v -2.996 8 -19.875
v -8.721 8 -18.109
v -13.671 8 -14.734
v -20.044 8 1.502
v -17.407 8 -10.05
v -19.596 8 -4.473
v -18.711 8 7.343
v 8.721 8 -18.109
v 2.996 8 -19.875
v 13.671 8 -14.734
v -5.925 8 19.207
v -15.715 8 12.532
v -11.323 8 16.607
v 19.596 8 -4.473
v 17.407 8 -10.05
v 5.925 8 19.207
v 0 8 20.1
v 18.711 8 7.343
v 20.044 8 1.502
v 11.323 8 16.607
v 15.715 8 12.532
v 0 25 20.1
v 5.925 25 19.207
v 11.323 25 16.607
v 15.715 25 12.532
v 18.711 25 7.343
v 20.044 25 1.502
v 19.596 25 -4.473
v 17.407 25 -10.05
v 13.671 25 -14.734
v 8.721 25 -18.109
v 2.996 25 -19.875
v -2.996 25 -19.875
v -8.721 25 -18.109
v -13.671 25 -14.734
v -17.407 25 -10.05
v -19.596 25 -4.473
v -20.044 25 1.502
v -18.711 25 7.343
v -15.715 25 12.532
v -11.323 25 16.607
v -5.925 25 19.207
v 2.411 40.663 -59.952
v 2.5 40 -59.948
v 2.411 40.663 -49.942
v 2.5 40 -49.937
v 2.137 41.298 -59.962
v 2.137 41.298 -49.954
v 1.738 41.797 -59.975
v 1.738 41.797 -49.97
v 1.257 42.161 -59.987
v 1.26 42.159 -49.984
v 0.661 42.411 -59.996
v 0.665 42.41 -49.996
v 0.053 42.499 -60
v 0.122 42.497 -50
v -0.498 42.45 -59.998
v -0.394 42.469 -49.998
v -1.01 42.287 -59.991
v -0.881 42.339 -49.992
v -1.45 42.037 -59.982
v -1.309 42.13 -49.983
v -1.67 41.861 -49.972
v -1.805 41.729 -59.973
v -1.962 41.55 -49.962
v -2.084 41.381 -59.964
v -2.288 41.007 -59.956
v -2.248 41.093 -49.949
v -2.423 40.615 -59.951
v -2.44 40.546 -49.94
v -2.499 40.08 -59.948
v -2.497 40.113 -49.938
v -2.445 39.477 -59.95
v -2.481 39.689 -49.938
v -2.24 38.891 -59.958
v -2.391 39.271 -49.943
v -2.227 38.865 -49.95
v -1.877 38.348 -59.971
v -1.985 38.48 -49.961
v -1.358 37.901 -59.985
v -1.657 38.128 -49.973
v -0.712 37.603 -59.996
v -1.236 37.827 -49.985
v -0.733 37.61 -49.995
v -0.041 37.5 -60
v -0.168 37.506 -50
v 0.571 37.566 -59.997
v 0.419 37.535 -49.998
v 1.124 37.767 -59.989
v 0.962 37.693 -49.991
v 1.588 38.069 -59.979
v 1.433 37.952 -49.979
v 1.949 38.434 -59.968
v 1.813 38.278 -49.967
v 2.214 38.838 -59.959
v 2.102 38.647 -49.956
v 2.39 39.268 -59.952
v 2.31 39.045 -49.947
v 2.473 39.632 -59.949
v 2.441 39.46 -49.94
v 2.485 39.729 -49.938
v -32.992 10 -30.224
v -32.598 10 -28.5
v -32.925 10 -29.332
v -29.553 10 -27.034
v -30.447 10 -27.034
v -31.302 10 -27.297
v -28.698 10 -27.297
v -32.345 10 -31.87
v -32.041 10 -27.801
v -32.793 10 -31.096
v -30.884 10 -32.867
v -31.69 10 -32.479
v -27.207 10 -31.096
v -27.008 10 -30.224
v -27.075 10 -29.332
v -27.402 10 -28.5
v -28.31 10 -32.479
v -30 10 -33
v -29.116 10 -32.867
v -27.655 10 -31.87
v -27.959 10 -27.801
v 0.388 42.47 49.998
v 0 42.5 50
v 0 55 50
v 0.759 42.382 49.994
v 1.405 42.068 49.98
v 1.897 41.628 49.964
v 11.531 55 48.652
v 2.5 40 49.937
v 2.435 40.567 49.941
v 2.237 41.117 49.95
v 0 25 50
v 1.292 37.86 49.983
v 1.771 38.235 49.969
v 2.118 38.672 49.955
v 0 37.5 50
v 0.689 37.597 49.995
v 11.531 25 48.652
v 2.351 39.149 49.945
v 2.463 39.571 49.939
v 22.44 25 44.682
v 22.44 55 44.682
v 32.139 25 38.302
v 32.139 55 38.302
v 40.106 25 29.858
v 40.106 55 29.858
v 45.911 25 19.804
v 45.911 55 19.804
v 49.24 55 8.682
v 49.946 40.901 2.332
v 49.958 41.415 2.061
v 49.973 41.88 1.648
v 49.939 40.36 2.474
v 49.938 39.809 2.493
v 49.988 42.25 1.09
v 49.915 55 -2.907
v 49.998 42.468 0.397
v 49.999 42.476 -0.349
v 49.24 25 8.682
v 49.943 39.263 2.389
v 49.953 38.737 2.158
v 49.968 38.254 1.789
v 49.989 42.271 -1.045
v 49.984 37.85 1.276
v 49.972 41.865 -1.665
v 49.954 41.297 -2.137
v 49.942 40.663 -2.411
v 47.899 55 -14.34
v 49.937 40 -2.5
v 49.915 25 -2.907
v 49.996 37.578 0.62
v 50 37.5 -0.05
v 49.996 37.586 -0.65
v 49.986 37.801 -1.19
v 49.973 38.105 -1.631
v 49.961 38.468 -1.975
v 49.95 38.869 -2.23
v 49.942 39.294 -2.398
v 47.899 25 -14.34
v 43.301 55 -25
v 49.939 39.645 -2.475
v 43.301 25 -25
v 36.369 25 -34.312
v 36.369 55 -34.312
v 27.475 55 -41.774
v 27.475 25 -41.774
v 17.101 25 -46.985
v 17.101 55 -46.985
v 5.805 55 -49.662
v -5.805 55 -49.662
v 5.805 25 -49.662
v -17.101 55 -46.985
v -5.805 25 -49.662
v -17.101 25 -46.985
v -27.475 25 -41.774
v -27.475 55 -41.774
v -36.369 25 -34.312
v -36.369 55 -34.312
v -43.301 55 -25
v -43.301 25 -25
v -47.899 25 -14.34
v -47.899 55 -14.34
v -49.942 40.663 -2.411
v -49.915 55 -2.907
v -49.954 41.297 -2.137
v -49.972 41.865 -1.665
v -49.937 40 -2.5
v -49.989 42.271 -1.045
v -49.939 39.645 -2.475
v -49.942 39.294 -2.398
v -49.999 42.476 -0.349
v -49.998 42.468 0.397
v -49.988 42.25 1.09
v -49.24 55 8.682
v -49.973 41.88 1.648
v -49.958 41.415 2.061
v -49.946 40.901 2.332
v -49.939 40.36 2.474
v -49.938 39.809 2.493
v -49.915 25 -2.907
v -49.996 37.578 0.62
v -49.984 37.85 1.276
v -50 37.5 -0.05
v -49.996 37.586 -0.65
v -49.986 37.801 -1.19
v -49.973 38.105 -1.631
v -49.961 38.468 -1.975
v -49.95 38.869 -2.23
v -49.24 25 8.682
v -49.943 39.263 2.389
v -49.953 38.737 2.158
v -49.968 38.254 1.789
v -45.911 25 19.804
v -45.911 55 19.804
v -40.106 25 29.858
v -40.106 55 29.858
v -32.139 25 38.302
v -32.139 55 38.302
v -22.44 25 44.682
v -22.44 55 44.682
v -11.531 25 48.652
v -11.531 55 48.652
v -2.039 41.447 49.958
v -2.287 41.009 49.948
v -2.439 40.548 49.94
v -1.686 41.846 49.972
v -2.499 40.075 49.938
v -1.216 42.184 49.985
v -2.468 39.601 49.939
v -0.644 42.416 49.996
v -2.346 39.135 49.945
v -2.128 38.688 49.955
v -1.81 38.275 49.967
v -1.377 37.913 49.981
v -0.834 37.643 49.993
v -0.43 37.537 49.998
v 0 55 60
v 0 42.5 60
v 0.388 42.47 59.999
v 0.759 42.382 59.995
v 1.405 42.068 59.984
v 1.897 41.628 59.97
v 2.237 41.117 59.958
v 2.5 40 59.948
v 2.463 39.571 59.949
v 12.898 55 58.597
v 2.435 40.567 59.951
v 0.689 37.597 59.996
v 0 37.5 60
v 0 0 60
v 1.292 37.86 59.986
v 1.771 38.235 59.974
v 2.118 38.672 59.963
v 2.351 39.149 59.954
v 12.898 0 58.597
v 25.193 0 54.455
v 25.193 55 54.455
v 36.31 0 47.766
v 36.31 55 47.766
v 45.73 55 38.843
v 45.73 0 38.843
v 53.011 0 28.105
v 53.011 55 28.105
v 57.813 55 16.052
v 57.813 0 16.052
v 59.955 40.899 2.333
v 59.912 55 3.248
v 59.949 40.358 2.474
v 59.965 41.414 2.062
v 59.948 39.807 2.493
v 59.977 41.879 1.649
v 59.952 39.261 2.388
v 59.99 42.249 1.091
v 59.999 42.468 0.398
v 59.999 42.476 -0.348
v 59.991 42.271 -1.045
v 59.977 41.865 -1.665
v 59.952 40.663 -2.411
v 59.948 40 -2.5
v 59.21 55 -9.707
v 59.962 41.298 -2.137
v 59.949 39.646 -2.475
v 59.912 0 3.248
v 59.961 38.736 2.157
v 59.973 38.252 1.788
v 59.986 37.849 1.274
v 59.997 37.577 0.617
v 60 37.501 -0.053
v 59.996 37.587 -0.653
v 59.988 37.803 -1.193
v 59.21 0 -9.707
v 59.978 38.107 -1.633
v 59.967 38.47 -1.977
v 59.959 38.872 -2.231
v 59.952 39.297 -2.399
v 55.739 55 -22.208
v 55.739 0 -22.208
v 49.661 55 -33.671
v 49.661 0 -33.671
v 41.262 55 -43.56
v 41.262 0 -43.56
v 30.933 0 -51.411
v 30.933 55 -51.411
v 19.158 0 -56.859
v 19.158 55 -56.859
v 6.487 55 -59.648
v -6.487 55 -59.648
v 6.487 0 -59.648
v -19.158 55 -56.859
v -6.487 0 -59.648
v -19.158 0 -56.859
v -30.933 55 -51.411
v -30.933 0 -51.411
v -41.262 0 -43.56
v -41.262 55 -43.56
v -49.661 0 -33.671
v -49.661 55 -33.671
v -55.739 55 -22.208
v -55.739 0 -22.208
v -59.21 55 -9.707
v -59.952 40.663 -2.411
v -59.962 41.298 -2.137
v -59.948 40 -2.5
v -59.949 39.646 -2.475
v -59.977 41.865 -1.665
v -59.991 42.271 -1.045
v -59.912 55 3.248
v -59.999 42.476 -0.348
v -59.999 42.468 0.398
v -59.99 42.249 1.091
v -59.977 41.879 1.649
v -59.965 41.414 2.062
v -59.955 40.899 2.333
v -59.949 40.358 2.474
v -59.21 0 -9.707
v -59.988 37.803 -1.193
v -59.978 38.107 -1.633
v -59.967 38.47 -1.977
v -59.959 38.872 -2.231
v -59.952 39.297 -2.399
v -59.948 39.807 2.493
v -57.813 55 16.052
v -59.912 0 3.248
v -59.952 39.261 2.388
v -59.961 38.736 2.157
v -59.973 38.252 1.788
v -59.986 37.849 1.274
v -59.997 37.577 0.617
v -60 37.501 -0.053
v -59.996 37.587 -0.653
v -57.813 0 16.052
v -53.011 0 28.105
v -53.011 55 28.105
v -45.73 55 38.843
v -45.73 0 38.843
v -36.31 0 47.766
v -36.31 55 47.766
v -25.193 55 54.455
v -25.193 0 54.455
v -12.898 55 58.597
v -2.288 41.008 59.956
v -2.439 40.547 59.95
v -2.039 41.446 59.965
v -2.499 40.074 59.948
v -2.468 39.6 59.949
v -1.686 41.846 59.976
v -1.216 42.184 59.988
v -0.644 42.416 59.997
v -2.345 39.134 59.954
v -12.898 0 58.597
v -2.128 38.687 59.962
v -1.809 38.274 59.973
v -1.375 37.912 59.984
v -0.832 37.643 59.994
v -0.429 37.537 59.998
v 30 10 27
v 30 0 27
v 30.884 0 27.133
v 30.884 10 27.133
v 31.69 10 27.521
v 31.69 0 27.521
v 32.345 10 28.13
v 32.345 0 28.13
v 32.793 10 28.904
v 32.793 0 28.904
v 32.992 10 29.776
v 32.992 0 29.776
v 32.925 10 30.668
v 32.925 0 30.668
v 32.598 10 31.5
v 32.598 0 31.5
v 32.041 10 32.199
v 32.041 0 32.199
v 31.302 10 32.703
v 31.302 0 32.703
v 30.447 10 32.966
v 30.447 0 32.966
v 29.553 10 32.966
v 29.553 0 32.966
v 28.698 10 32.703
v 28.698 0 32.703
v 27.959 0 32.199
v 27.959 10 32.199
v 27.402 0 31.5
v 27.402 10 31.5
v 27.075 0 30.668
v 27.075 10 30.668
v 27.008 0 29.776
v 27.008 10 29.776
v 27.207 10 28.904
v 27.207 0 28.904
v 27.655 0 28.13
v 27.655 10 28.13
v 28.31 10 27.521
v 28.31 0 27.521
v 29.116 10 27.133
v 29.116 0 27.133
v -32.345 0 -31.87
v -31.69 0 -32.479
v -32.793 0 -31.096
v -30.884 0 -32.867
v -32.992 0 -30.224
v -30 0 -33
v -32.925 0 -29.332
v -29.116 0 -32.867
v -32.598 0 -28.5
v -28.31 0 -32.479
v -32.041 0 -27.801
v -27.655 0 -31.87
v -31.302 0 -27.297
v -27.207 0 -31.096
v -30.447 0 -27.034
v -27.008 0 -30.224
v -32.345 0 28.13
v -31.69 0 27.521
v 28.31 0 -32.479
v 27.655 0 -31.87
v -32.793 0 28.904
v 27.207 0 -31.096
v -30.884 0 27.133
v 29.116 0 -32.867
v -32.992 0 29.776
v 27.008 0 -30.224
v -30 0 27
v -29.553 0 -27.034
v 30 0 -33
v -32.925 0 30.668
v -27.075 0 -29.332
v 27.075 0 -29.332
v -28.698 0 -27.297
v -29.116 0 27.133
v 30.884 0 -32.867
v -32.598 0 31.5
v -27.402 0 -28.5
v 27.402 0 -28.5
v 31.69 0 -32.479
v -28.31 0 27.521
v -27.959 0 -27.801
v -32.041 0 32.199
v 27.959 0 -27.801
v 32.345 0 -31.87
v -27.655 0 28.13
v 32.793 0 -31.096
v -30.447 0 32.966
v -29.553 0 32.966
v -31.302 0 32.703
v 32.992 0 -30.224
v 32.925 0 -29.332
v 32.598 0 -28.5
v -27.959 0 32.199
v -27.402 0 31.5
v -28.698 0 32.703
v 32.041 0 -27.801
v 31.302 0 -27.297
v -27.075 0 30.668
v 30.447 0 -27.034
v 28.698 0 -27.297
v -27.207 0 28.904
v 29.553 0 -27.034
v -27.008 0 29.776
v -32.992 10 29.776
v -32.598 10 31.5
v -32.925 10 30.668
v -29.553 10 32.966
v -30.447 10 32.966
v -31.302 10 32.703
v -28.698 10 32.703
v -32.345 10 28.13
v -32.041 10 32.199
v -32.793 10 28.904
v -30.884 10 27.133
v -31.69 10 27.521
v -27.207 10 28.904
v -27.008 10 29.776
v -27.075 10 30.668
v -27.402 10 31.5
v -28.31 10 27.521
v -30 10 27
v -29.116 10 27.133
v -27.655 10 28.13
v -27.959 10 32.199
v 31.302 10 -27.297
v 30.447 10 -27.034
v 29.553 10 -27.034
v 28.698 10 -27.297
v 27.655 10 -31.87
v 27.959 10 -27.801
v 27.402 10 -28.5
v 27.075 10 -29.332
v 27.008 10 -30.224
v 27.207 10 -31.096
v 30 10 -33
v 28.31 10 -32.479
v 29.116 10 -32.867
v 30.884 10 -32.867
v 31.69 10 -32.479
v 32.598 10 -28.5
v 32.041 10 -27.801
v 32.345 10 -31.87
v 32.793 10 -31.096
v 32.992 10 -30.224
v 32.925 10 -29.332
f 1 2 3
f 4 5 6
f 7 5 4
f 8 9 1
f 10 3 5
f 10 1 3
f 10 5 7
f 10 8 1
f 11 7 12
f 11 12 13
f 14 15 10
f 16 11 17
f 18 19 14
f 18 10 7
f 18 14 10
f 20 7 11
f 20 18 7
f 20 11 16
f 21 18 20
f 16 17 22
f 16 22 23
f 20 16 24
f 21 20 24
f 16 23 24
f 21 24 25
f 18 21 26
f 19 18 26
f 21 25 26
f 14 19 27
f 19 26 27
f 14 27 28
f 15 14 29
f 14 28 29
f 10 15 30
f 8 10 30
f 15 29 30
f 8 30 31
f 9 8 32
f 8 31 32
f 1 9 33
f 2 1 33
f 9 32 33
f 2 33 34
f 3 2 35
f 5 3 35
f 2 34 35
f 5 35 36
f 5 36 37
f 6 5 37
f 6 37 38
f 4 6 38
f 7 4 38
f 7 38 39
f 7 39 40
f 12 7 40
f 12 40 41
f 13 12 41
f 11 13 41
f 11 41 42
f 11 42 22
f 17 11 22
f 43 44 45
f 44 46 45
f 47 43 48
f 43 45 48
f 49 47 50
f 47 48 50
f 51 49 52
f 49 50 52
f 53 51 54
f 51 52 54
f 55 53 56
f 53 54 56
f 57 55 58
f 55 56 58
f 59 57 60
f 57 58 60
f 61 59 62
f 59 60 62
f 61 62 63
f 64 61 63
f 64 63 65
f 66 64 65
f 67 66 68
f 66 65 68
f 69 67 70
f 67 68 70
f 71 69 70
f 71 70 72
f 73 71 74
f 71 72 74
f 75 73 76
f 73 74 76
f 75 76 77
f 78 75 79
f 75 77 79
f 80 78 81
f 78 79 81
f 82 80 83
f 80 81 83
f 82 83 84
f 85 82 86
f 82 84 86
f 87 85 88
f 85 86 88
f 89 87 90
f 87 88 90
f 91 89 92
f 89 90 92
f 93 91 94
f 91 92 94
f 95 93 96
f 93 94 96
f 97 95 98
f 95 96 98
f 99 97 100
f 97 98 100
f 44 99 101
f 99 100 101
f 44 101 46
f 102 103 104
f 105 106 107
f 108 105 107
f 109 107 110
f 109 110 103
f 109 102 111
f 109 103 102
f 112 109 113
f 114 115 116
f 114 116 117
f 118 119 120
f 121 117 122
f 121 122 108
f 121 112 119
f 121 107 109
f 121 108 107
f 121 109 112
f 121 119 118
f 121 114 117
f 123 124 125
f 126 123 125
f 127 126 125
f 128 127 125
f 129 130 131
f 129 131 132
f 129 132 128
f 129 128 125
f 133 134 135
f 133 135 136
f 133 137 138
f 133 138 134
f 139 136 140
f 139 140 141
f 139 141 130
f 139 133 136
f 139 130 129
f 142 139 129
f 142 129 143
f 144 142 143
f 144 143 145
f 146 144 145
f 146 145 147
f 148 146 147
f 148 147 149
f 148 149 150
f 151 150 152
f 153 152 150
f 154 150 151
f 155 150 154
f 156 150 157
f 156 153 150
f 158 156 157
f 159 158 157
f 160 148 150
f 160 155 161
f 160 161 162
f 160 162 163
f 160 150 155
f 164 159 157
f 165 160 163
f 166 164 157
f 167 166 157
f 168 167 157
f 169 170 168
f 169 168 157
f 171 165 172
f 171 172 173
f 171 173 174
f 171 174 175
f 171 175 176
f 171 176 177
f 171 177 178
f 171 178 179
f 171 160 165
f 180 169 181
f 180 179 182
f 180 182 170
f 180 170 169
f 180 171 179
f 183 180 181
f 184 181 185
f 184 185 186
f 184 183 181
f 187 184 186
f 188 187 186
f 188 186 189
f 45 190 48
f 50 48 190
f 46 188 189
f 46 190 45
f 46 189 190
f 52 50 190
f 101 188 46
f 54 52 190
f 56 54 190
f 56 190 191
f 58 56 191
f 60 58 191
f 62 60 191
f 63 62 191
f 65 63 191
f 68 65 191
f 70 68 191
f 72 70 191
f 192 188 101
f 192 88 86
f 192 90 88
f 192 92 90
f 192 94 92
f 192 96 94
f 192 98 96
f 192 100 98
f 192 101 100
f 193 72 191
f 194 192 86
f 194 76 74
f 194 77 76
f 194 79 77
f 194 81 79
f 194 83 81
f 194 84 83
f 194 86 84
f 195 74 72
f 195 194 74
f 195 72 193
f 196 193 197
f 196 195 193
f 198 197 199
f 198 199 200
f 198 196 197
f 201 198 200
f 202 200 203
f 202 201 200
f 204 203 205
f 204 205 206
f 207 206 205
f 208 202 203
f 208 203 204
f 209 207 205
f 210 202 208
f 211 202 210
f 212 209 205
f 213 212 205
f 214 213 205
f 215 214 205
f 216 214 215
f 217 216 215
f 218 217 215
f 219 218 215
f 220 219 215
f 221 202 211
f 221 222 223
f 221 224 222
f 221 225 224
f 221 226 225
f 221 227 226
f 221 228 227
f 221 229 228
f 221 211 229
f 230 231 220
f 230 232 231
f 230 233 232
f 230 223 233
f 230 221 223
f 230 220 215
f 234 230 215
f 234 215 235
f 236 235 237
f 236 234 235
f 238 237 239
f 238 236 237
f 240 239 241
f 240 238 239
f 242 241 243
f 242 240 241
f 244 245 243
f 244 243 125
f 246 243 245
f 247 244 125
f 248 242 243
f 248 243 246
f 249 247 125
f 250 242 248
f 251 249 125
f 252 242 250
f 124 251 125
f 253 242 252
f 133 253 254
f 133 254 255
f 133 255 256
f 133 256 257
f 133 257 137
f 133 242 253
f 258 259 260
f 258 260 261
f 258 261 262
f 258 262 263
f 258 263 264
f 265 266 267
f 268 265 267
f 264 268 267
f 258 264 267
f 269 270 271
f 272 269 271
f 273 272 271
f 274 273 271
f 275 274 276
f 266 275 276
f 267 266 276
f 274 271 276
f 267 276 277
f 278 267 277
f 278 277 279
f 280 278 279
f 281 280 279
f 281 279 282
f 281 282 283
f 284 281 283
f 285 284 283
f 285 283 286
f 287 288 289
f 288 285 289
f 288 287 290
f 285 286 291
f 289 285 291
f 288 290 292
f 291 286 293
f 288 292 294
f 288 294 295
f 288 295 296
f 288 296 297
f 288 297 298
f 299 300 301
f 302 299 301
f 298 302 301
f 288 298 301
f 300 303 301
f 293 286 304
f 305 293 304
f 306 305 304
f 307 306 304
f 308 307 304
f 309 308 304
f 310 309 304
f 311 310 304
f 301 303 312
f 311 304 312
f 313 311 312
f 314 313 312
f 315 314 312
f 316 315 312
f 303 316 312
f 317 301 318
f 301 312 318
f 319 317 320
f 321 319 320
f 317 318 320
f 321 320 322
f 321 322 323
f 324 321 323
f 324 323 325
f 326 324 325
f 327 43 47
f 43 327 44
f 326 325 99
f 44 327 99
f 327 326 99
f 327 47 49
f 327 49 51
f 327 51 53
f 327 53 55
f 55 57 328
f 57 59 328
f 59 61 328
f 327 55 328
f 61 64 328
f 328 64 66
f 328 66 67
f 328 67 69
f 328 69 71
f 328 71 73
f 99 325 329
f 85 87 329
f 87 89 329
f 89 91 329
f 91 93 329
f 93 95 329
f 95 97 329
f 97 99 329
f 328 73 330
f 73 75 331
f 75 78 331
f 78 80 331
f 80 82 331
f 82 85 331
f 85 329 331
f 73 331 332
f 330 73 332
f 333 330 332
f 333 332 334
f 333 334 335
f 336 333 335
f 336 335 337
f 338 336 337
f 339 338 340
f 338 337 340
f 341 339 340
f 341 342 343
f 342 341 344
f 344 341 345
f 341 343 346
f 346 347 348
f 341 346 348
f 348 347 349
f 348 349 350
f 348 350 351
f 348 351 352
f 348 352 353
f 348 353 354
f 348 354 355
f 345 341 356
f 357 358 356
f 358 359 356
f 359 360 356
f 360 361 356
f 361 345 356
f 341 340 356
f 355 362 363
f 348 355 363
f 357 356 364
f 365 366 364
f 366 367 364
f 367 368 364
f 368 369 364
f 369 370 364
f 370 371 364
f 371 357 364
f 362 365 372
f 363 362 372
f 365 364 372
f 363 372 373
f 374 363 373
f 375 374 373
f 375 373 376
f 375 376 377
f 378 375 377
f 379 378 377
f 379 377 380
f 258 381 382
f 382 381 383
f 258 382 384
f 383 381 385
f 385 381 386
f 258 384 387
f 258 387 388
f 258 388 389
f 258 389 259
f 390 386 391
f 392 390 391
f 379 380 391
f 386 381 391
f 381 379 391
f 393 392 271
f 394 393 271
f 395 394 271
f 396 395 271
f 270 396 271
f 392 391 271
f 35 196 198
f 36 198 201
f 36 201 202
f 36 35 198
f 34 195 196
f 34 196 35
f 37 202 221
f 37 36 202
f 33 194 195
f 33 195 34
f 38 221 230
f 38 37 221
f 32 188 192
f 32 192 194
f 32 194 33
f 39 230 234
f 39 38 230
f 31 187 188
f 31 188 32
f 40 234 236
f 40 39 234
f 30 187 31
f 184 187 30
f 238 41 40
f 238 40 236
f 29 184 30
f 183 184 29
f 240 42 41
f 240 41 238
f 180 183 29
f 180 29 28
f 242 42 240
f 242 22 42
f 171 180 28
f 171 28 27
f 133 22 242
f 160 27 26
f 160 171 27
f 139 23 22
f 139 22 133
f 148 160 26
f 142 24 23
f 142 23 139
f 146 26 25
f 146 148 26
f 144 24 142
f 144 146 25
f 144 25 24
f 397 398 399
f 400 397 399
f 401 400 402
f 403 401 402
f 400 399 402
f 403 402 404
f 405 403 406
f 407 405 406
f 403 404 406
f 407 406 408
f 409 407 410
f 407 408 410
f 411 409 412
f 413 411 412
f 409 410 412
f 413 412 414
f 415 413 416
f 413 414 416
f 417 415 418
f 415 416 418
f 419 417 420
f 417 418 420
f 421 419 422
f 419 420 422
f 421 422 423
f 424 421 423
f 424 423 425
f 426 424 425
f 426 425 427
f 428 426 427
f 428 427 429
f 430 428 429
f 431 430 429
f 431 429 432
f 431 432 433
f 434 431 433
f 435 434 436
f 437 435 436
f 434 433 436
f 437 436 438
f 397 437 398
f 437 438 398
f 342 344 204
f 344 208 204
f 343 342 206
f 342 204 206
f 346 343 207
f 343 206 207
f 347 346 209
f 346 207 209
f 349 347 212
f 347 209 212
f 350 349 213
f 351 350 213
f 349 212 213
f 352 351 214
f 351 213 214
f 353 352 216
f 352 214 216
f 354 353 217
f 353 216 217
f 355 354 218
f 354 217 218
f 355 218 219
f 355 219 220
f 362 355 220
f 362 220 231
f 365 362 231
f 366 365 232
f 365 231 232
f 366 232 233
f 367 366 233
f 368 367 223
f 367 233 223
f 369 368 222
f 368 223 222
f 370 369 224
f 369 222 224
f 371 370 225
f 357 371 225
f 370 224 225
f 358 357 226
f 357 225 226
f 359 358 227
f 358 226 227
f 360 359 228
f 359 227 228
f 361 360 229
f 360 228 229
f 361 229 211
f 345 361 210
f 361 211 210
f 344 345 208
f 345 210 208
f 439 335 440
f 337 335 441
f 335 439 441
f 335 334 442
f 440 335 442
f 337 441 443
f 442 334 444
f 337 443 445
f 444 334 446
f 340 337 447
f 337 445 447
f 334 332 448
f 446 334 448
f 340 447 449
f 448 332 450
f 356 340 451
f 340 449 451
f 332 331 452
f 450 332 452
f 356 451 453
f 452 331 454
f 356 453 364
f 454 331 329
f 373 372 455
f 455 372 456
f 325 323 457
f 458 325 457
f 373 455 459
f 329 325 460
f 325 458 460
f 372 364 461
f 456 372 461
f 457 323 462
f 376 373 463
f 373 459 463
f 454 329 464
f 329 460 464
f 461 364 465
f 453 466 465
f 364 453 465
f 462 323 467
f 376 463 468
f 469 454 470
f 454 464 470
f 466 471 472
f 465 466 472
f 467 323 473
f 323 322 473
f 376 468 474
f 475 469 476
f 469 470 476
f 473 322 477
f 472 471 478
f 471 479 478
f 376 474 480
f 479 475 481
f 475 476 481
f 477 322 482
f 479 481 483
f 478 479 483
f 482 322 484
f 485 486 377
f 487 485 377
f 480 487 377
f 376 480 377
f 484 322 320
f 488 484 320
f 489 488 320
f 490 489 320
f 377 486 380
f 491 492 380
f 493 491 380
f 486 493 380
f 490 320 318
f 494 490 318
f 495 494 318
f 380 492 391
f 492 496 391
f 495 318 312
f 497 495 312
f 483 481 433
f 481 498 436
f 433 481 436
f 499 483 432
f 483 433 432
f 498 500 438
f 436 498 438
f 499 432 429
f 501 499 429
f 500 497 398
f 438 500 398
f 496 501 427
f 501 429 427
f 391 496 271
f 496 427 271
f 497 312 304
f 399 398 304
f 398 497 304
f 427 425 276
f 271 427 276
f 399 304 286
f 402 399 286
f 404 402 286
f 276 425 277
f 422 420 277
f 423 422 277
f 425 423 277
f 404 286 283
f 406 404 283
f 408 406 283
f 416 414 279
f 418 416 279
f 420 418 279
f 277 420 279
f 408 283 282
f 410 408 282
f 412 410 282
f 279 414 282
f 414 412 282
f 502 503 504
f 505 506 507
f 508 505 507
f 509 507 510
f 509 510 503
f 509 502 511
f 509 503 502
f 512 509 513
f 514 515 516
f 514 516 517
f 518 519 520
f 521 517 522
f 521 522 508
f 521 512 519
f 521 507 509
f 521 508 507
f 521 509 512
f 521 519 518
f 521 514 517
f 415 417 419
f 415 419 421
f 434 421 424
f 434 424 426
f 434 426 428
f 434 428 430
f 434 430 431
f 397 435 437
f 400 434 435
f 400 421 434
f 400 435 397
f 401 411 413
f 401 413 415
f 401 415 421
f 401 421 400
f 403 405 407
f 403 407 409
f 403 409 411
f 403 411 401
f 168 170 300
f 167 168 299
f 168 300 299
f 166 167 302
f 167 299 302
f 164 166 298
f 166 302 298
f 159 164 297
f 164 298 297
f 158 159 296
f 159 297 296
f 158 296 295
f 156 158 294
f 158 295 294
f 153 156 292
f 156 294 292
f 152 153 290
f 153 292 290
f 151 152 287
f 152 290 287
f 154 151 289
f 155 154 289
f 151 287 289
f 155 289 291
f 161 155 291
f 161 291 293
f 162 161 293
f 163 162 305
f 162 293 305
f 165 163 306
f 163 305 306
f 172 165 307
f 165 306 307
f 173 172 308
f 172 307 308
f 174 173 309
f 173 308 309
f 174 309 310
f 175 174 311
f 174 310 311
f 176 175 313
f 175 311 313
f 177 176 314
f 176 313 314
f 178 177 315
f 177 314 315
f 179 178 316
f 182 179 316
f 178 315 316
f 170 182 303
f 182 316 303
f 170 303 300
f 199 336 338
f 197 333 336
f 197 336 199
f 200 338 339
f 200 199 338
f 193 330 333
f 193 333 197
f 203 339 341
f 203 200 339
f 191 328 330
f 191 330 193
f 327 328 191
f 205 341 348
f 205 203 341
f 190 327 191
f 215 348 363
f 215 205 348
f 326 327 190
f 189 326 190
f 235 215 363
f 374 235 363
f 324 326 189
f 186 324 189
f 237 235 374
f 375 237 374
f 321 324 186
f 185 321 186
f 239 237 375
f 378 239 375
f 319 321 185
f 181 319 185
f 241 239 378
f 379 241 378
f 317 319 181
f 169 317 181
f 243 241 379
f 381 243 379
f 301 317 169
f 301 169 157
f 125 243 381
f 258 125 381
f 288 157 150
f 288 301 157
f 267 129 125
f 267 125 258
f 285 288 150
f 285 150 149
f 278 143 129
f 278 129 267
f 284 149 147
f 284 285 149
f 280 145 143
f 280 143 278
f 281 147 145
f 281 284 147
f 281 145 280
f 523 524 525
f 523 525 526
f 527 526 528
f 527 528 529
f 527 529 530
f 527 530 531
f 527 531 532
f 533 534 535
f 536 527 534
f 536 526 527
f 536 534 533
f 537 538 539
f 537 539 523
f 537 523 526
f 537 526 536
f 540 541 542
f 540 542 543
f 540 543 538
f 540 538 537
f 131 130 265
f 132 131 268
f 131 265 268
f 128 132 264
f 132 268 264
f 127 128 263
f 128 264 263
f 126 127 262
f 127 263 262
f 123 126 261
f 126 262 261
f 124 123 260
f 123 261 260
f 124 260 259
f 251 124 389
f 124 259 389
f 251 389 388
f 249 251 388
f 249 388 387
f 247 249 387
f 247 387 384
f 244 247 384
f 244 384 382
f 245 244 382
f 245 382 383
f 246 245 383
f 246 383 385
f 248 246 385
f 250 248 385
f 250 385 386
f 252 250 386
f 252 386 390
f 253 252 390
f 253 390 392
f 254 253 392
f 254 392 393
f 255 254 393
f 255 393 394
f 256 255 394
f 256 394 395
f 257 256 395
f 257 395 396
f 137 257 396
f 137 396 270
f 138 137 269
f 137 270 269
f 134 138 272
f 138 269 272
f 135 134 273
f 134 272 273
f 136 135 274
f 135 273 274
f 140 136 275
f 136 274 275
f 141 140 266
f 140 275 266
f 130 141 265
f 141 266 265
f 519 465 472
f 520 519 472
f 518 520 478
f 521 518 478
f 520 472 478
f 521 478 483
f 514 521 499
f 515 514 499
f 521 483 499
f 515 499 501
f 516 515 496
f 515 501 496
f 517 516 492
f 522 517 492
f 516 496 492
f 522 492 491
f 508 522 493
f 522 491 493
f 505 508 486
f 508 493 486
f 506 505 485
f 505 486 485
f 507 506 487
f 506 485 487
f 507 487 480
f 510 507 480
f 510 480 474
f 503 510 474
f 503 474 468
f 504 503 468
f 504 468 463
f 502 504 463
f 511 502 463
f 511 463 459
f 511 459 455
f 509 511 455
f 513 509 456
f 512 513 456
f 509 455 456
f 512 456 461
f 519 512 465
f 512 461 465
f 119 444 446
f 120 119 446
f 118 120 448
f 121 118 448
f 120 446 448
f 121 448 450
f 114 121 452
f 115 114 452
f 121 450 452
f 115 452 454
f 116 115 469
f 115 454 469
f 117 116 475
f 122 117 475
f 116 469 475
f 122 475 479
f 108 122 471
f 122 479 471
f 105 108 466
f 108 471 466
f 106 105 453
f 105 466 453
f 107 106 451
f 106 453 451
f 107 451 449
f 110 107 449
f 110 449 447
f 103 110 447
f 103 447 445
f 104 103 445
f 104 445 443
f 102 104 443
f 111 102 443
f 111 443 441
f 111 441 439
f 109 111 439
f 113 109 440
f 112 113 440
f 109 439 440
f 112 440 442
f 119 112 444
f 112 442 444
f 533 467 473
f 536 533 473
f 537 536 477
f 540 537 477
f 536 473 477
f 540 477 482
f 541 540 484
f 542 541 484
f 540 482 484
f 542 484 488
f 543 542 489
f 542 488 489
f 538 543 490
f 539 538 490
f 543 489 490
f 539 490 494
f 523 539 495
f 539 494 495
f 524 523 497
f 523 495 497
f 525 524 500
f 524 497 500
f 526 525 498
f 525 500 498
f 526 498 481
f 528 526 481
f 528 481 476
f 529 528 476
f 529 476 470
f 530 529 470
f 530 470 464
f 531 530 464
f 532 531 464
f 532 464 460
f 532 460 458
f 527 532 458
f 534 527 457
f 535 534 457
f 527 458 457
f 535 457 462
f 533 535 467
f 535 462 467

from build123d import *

# Parameters (mm, degrees)
SKETCH1_R           = 60
BOSS_EXTRUDE1_DEPTH = 35
SKETCH2_R           = 20.1
CUT_EXTRUDE1_DEPTH  = 17
SKETCH3_R           = 3
CUT_EXTRUDE2_DEPTH  = 10
SKETCH5_R           = 50
CUT_EXTRUDE3_DEPTH  = 10
MOVE_FACE1_BY       = 20
MOVE_FACE4_BY       = 10
SKETCH6_R           = 2.5
CUT_EXTRUDE4_DEPTH  = 102.118742081
CIRPATTERN1_COUNT   = 2
CIRPATTERN1_ANGLE   = 90


with BuildPart() as part:
    # Sketch1 → Boss-Extrude1 (new body)
    with BuildSketch(Plane(origin=(0, 0, 0), x_dir=(1, 0, 0), z_dir=(0, 1, 0))):
        with Locations(Location((0, 0, 0), (0, 0, 270))):
            Circle(SKETCH1_R)
    extrude(amount=BOSS_EXTRUDE1_DEPTH)

    # Sketch2 → Cut-Extrude1 (cut)
    with BuildSketch(Plane(origin=(0, 35, 0), x_dir=(1, 0, 0), z_dir=(0, 1, 0))):
        with Locations(Location((0, 0, 0), (0, 0, 270))):
            Circle(SKETCH2_R)
    extrude(amount=-CUT_EXTRUDE1_DEPTH, mode=Mode.SUBTRACT)

    # Sketch3 → Cut-Extrude2 (cut)
    with BuildSketch(Plane.XZ):
        with Locations(Location((-30, 30, 0), (0, 0, 270))):
            Circle(SKETCH3_R)
        with Locations(Location((30, 30, 0), (0, 0, 270))):
            Circle(SKETCH3_R)
        with Locations(Location((30, -30, 0), (0, 0, 270))):
            Circle(SKETCH3_R)
        with Locations(Location((-30, -30, 0), (0, 0, 270))):
            Circle(SKETCH3_R)
    extrude(amount=-CUT_EXTRUDE2_DEPTH, mode=Mode.SUBTRACT)

    # Sketch5 → Cut-Extrude3 (cut)
    with BuildSketch(Plane(origin=(0, 35, 0), x_dir=(1, 0, 0), z_dir=(0, 1, 0))):
        with Locations(Location((0, 0, 0), (0, 0, 270))):
            Circle(SKETCH5_R)
    extrude(amount=-CUT_EXTRUDE3_DEPTH, mode=Mode.SUBTRACT)

    # Move Face1: a face moved outward by 20.0
    extrude(part.faces().sort_by_distance((-30, 35, 48))[0], amount=MOVE_FACE1_BY, dir=(0, 1, 0))

    # Move Face4: a face moved inward by 10.0
    extrude(part.faces().sort_by_distance((0, 18, 0))[0], amount=MOVE_FACE4_BY, dir=(0, -1, 0), mode=Mode.SUBTRACT)

    # Sketch6 → Cut-Extrude4 (cut, symmetric)
    with BuildSketch(Plane(origin=(0, 0, 0), x_dir=(0, 0, -1), z_dir=(1, 0, 0))):
        with Locations((0, 40)):
            Circle(SKETCH6_R)
    cut_extrude4 = extrude(amount=CUT_EXTRUDE4_DEPTH, both=True, mode=Mode.SUBTRACT)

    # CirPattern1: Cut-Extrude4 ×2 about axis
    cirpattern1_axis = Axis((0, 35, 0), (0, -1, 0))
    for i in range(1, CIRPATTERN1_COUNT):
        add(cut_extrude4.rotate(cirpattern1_axis, i * CIRPATTERN1_ANGLE / (CIRPATTERN1_COUNT - 1)), mode=Mode.SUBTRACT)


solid = part.part
